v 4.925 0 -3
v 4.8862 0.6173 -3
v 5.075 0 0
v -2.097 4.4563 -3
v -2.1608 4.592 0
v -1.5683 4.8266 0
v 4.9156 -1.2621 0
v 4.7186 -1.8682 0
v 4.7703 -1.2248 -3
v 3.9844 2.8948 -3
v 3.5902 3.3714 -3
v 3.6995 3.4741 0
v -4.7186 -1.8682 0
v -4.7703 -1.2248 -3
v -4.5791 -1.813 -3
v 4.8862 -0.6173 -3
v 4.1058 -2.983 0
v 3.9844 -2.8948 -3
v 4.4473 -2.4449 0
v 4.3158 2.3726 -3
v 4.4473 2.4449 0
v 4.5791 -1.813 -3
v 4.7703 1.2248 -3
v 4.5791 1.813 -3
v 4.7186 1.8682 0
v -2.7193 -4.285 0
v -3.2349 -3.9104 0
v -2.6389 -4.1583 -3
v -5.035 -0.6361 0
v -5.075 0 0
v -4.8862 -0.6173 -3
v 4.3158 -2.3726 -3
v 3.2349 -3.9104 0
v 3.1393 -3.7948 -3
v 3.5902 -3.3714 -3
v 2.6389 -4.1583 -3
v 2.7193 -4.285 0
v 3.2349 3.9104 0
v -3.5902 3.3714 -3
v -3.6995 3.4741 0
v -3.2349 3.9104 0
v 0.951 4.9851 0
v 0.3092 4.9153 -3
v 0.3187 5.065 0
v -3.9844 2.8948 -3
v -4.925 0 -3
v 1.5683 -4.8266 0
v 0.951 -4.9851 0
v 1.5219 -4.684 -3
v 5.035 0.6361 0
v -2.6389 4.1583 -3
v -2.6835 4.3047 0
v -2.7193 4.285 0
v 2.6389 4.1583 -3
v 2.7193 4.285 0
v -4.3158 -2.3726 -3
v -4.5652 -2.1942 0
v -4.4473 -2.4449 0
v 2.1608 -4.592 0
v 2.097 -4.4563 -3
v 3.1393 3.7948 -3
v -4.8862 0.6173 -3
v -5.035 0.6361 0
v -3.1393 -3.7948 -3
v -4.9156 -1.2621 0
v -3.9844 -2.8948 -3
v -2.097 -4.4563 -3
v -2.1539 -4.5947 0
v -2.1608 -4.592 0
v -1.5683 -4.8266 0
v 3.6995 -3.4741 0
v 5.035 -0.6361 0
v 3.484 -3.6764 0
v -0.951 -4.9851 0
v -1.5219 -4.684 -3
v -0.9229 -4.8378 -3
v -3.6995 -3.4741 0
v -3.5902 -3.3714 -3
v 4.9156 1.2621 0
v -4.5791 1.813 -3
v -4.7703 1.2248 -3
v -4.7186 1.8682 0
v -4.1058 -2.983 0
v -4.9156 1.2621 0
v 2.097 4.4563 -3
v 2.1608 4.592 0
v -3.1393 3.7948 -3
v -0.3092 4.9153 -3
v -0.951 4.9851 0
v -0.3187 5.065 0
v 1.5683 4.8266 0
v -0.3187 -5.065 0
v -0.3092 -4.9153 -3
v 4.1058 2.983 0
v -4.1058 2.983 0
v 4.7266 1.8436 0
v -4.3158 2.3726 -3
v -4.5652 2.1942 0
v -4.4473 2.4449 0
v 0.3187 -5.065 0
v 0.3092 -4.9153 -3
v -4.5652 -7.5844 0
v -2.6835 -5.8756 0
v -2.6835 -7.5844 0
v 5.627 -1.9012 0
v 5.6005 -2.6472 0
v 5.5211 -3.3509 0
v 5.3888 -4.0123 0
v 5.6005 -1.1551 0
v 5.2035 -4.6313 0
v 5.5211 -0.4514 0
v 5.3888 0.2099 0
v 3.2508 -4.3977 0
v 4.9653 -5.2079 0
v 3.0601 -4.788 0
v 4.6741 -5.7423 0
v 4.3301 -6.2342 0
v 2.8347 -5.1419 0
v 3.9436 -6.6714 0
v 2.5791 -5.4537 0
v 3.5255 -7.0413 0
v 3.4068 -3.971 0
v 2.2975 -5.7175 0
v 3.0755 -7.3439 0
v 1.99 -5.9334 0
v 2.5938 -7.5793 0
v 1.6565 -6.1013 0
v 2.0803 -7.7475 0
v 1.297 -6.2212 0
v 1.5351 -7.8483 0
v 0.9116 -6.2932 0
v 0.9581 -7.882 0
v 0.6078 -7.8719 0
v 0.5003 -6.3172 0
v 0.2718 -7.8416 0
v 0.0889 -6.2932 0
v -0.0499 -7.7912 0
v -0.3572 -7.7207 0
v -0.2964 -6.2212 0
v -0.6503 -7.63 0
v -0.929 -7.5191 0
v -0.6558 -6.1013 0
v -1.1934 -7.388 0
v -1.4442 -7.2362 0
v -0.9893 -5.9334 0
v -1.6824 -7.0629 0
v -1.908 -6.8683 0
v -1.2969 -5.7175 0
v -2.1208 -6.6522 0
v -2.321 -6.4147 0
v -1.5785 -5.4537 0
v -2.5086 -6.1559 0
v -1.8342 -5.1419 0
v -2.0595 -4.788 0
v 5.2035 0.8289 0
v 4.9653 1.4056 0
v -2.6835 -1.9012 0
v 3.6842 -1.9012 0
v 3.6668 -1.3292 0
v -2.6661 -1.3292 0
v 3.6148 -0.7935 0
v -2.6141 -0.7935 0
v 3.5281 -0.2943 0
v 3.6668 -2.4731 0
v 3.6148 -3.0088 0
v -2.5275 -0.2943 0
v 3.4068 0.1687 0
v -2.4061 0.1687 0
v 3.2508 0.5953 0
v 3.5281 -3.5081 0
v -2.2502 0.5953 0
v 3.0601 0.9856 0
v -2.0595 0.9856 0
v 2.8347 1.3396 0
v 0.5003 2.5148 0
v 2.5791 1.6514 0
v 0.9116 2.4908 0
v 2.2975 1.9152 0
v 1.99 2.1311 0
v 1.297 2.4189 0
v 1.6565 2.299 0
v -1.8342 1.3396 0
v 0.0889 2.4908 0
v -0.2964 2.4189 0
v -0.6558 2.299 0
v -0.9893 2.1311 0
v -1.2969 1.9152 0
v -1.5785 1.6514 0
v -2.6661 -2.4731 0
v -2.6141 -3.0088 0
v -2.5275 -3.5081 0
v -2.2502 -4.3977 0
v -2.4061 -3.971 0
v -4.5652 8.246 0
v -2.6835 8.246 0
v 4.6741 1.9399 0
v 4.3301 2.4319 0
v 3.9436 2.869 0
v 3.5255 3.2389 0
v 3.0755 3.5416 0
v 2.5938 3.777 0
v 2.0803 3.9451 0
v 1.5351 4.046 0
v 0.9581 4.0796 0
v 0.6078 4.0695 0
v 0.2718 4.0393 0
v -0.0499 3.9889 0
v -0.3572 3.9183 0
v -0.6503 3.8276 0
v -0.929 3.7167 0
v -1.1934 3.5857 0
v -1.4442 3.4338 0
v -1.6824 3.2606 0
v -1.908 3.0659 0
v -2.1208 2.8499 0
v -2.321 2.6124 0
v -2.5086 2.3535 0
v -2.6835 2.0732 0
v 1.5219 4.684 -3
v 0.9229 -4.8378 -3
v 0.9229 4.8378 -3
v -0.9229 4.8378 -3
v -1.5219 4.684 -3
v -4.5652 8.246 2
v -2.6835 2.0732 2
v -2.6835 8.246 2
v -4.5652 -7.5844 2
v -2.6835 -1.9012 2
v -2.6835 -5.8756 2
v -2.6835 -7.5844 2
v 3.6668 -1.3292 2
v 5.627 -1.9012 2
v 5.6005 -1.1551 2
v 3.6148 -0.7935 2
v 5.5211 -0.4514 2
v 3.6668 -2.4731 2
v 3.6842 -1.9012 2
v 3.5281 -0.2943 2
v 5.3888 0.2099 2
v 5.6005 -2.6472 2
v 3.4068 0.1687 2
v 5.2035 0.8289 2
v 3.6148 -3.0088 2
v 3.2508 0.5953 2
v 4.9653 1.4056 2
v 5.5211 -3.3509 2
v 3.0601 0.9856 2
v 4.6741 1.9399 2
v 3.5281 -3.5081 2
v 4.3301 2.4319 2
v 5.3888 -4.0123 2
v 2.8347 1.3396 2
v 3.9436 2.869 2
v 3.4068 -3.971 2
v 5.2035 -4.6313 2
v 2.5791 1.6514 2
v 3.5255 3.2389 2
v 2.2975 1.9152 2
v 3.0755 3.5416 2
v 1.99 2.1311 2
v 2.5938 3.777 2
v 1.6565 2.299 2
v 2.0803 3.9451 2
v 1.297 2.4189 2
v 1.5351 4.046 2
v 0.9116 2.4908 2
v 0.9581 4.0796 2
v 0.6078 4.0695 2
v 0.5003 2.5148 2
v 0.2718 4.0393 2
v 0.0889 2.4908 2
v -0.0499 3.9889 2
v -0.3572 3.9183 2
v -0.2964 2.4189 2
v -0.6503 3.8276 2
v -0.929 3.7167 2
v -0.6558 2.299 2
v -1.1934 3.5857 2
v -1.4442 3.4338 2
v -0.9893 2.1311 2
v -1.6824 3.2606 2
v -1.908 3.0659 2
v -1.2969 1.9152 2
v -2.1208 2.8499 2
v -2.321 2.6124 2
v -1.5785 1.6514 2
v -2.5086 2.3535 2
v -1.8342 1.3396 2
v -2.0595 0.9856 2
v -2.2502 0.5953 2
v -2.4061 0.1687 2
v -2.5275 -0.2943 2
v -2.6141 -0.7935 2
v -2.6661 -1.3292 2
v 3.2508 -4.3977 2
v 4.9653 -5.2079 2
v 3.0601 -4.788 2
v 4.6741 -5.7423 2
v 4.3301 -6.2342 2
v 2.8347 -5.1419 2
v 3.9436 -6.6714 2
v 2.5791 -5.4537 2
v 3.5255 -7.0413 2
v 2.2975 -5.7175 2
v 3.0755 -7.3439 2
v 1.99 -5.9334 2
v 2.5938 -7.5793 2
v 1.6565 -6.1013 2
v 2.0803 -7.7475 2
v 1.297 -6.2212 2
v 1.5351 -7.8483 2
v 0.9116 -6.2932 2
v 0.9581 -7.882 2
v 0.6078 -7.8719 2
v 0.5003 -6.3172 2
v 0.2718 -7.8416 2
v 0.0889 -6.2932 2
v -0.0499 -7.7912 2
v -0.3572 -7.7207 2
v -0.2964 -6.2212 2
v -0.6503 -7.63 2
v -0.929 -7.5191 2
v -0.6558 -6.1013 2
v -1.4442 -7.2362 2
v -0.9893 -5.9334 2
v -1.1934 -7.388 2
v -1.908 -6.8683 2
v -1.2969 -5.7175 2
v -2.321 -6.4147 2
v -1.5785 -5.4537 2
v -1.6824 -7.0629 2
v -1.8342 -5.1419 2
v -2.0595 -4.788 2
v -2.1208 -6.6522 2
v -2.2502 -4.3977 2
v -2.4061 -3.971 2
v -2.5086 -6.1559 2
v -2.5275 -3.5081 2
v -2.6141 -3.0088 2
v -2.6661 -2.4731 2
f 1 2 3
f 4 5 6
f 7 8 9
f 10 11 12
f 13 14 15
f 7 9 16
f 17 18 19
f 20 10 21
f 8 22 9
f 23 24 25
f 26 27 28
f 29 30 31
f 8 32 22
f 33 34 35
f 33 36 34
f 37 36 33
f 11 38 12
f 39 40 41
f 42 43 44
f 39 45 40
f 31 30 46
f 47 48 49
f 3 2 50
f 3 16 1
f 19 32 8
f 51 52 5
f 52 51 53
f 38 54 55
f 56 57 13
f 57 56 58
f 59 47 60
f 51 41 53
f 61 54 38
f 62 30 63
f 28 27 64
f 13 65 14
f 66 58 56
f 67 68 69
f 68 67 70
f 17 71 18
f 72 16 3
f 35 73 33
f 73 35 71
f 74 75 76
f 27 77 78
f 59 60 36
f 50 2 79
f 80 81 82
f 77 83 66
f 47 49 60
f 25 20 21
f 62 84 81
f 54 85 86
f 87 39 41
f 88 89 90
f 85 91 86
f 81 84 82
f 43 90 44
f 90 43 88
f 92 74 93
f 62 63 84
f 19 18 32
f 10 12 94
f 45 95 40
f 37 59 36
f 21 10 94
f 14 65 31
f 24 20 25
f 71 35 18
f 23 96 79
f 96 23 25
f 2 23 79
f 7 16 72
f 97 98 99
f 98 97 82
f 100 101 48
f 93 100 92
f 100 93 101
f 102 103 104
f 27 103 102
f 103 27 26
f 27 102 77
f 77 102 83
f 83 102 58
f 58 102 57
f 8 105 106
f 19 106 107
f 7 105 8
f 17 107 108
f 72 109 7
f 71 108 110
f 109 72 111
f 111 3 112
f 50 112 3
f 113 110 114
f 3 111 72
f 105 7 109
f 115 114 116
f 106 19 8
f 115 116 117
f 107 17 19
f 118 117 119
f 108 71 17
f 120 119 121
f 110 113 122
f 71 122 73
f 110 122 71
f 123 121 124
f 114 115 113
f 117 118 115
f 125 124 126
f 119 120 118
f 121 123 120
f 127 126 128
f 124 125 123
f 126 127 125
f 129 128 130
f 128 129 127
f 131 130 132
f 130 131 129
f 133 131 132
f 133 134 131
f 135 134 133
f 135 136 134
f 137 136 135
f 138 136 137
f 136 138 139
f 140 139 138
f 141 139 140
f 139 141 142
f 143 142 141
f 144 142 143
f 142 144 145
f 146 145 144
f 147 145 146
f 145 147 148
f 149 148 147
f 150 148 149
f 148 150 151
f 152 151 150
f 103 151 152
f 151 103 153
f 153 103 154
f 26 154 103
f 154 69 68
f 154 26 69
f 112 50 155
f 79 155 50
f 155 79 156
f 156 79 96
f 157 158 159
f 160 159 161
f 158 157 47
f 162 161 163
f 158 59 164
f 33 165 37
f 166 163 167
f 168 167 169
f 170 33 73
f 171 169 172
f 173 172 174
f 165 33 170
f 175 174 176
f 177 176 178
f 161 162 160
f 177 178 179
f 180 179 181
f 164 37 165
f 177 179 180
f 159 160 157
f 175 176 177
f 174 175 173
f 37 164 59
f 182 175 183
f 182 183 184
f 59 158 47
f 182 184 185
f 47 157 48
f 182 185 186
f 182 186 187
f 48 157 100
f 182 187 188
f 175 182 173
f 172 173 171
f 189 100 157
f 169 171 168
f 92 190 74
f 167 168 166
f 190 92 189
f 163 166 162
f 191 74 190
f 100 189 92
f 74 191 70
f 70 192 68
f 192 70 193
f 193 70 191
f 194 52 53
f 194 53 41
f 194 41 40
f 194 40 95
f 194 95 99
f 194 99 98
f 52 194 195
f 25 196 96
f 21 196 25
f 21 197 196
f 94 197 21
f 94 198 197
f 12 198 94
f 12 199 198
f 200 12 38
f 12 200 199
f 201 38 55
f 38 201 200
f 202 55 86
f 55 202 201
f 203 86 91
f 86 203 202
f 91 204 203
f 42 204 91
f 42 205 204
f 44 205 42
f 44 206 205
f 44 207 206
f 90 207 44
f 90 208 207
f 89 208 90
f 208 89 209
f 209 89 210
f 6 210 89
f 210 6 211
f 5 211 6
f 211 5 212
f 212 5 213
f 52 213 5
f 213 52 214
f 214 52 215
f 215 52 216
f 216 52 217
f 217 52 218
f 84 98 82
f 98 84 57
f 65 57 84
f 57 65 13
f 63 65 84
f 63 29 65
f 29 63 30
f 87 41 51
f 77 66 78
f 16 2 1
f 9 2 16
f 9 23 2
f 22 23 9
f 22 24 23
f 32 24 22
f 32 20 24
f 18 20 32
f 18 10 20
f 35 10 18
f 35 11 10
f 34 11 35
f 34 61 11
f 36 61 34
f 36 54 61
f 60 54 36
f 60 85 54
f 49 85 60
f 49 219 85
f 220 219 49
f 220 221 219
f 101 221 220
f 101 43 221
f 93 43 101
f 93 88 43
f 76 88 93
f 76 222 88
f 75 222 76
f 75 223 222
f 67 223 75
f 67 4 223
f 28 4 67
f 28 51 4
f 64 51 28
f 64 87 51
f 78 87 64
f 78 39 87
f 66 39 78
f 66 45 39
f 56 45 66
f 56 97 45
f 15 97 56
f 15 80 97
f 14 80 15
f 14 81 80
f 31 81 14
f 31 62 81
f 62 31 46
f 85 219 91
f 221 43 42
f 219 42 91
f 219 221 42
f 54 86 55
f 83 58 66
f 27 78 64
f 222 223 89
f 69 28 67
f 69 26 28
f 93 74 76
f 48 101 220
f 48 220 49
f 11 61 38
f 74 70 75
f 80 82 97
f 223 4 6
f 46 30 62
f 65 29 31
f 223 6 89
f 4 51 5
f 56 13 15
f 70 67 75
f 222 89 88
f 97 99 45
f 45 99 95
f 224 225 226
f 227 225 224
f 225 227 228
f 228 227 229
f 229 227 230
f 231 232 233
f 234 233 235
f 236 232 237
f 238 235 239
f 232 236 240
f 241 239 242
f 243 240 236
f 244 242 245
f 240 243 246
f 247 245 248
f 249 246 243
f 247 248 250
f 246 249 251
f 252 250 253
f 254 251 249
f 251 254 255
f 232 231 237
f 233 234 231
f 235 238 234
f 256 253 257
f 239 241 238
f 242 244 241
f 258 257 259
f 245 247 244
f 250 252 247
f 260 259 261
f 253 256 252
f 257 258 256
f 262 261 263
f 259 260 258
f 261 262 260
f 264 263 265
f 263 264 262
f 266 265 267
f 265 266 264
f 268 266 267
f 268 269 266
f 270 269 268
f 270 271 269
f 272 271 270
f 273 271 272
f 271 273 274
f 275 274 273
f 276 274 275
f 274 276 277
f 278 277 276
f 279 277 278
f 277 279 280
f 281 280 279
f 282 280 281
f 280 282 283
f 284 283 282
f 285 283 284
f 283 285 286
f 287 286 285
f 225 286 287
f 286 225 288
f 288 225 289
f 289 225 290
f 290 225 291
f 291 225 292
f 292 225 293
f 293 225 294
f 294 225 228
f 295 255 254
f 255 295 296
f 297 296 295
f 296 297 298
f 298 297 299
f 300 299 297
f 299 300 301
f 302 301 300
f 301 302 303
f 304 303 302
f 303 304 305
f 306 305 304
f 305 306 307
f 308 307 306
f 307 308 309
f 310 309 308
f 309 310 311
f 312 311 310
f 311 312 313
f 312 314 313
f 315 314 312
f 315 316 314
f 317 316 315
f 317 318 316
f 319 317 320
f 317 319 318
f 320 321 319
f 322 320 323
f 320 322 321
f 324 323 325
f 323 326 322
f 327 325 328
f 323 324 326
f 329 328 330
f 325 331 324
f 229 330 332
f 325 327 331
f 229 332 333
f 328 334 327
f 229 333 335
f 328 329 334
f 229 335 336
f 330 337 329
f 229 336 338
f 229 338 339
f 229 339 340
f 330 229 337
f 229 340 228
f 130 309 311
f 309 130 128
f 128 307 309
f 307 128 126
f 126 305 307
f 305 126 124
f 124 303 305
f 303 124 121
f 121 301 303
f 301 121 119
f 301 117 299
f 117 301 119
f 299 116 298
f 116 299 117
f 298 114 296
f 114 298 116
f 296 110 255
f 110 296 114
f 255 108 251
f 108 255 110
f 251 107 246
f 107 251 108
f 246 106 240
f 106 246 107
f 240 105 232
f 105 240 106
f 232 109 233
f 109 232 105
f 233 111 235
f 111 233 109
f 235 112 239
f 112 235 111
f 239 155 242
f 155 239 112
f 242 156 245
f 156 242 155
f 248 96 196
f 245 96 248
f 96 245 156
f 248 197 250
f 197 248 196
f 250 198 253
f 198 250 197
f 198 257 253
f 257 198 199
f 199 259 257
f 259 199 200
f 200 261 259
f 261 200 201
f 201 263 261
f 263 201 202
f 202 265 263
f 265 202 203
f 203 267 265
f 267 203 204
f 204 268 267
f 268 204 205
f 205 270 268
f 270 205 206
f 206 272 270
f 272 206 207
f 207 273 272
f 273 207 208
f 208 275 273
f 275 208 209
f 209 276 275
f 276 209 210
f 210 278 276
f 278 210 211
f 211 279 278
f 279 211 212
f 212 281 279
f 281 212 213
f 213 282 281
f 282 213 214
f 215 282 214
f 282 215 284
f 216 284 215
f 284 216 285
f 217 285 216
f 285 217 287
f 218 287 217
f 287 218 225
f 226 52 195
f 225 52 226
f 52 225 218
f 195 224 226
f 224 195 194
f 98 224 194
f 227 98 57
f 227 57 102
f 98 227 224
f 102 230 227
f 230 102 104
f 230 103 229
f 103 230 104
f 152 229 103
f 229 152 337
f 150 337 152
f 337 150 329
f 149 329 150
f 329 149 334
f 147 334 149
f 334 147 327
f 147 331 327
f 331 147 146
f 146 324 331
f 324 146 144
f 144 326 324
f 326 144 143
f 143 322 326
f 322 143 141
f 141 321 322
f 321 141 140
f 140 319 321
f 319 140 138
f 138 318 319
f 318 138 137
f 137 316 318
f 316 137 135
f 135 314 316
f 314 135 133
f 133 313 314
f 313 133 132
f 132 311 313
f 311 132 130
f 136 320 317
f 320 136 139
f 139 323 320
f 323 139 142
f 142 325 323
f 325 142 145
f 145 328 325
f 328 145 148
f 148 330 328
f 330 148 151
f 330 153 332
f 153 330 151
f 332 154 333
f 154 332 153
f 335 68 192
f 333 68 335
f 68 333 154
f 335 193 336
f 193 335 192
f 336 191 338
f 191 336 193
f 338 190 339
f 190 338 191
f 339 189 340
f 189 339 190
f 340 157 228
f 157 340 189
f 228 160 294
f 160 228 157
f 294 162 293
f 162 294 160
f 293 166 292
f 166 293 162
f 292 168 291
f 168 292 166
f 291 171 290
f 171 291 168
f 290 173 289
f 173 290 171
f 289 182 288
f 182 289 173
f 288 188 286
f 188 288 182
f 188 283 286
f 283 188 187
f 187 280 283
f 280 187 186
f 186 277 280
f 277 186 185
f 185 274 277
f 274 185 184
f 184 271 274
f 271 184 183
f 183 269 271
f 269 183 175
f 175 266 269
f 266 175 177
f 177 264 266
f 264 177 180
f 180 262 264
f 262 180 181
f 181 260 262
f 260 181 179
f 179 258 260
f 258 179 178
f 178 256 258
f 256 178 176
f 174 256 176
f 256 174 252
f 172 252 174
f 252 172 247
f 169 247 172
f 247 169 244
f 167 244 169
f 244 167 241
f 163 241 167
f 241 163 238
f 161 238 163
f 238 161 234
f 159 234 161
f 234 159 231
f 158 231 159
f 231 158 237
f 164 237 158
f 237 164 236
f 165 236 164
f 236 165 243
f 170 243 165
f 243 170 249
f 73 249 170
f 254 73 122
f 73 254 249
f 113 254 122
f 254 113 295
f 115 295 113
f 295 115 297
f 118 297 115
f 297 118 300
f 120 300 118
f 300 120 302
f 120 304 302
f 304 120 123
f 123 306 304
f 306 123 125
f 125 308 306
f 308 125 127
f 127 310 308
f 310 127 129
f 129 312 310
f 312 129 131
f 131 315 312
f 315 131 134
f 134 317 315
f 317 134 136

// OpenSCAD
$fn = 50;


difference() {
	union() {
		translate(v = [0, 0, -3.0000000000]) {
			cylinder(h = 3, r1 = 4.9250000000, r2 = 5.0750000000);
		}
		linear_extrude(height = 2) {
			text(font = "Webdings", halign = "center", size = 15, text = "b", valign = "center");
		}
	}
	union();
}
